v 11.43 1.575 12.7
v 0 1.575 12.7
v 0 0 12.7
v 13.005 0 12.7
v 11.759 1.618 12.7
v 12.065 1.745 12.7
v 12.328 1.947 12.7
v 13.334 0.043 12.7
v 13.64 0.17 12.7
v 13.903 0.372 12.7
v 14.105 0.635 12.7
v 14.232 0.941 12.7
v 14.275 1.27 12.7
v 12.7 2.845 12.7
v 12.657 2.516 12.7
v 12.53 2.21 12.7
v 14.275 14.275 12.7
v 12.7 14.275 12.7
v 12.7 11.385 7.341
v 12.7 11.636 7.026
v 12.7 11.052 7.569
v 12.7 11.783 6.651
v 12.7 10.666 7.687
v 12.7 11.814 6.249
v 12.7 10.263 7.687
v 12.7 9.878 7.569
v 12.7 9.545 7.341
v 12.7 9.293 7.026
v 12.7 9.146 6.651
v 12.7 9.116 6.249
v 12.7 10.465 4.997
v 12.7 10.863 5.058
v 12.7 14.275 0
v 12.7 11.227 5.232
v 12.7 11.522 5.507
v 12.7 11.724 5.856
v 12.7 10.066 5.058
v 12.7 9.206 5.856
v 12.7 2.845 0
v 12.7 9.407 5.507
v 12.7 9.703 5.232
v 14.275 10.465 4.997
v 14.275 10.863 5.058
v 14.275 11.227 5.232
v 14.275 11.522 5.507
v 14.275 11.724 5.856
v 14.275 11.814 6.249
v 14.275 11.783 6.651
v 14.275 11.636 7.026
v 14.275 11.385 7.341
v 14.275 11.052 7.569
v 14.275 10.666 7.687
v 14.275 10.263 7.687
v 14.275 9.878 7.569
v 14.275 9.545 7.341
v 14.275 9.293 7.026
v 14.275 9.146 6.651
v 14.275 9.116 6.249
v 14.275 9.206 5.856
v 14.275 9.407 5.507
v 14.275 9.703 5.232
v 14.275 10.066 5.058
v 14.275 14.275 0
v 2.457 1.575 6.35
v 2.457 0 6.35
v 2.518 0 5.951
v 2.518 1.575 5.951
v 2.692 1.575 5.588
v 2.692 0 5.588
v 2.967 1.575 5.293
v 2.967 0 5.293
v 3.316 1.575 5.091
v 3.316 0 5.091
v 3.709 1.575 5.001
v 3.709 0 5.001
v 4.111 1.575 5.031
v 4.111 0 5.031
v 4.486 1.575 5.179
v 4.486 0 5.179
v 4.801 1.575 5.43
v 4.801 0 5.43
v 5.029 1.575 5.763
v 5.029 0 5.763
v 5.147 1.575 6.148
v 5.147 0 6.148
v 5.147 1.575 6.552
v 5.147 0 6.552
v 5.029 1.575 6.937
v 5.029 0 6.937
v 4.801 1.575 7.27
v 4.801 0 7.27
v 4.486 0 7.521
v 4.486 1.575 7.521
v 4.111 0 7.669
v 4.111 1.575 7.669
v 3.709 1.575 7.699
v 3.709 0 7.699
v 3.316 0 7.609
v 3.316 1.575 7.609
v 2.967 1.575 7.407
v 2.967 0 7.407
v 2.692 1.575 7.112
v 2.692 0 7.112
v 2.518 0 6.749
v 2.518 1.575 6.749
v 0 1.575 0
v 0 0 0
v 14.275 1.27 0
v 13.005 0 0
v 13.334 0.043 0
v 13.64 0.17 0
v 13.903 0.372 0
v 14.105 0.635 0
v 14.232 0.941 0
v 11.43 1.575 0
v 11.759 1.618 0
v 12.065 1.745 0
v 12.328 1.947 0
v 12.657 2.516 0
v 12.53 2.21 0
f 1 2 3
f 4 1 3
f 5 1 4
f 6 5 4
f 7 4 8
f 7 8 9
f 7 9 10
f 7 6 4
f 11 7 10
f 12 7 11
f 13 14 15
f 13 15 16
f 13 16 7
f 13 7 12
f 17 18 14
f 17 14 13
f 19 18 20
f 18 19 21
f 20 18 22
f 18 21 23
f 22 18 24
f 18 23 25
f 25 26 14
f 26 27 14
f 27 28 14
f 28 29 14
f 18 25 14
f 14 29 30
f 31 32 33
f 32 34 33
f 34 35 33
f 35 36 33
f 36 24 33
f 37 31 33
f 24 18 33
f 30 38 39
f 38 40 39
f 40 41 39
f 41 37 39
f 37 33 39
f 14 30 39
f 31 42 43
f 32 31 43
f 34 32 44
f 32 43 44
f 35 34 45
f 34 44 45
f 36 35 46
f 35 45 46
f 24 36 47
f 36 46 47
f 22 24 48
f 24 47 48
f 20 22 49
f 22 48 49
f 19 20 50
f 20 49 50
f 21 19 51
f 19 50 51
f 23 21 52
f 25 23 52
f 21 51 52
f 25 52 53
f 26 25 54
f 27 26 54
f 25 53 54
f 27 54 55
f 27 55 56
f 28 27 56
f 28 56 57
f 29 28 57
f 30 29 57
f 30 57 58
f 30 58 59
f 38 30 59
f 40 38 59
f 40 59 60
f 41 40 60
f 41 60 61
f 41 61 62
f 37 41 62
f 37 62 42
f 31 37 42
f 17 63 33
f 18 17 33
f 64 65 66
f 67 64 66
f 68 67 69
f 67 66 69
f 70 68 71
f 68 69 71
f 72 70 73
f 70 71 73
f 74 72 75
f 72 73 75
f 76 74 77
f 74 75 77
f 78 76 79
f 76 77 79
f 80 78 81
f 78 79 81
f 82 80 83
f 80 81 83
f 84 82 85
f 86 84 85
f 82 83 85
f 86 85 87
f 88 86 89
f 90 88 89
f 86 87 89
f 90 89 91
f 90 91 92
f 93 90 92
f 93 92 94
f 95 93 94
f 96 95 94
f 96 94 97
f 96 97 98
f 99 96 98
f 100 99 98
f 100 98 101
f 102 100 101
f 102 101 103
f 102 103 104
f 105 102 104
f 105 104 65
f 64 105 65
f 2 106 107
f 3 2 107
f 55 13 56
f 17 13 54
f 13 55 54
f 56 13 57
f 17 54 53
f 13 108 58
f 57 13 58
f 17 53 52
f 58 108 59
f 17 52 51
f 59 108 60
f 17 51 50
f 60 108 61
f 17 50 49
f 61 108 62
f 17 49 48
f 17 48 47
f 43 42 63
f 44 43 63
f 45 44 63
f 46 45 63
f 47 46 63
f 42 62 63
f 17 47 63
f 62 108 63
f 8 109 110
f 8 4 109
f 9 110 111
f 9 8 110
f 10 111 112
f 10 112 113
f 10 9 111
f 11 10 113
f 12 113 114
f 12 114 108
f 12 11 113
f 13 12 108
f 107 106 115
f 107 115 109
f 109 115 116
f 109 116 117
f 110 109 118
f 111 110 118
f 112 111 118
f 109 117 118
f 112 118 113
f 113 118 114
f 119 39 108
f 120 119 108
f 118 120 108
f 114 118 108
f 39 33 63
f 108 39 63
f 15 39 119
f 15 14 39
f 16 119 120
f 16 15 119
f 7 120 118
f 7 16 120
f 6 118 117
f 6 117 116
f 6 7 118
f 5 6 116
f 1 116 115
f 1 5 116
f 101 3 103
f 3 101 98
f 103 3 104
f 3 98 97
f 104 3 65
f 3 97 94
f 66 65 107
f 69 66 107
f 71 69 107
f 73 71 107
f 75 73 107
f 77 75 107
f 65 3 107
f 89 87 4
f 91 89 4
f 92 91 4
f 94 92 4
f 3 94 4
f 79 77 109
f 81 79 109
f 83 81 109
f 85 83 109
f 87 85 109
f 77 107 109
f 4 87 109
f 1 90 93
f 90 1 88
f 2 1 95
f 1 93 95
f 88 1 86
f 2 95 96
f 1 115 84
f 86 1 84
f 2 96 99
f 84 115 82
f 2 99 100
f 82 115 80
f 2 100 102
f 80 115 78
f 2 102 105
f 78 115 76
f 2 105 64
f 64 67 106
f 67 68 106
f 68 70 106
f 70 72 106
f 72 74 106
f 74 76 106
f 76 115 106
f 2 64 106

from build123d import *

# Parameters (mm, degrees)
BOSS_EXTRUDE1_DEPTH   = 12.7
FILLET1_R             = 1.27
F_6_32_TAPPED_HOLE1_D = 2.7051
F_6_32_TAPPED_HOLE2_D = 2.7051


with BuildPart() as part:
    # Sketch1 → Boss-Extrude1 (new body)
    with BuildSketch(Plane.XY):
        Polygon((0, 0), (14.2748, 0), (14.2748, 14.2748), (12.7, 14.2748), (12.7, 1.5748), (0, 1.5748), align=None)
    extrude(amount=BOSS_EXTRUDE1_DEPTH)

    # Fillet1
    fillet1_edges = [part.edges().sort_by_distance(p)[0] for p in [
        (12.7, 1.5748, 6.35),
        (14.2748, 0, 6.35),
    ]]
    fillet(fillet1_edges, radius=FILLET1_R)

    # #6-32 Tapped Hole1 (through all)
    with Locations(Plane.ZY.offset(-12.7)):
        with Locations((6.35, 10.4648)):
            Hole(F_6_32_TAPPED_HOLE1_D / 2)

    # #6-32 Tapped Hole2 (through all)
    with Locations(Plane(origin=(0, 1.5748, 0), x_dir=(1, 0, 0), z_dir=(0, 1, 0))):
        with Locations((3.81, -6.35)):
            Hole(F_6_32_TAPPED_HOLE2_D / 2)


solid = part.part
